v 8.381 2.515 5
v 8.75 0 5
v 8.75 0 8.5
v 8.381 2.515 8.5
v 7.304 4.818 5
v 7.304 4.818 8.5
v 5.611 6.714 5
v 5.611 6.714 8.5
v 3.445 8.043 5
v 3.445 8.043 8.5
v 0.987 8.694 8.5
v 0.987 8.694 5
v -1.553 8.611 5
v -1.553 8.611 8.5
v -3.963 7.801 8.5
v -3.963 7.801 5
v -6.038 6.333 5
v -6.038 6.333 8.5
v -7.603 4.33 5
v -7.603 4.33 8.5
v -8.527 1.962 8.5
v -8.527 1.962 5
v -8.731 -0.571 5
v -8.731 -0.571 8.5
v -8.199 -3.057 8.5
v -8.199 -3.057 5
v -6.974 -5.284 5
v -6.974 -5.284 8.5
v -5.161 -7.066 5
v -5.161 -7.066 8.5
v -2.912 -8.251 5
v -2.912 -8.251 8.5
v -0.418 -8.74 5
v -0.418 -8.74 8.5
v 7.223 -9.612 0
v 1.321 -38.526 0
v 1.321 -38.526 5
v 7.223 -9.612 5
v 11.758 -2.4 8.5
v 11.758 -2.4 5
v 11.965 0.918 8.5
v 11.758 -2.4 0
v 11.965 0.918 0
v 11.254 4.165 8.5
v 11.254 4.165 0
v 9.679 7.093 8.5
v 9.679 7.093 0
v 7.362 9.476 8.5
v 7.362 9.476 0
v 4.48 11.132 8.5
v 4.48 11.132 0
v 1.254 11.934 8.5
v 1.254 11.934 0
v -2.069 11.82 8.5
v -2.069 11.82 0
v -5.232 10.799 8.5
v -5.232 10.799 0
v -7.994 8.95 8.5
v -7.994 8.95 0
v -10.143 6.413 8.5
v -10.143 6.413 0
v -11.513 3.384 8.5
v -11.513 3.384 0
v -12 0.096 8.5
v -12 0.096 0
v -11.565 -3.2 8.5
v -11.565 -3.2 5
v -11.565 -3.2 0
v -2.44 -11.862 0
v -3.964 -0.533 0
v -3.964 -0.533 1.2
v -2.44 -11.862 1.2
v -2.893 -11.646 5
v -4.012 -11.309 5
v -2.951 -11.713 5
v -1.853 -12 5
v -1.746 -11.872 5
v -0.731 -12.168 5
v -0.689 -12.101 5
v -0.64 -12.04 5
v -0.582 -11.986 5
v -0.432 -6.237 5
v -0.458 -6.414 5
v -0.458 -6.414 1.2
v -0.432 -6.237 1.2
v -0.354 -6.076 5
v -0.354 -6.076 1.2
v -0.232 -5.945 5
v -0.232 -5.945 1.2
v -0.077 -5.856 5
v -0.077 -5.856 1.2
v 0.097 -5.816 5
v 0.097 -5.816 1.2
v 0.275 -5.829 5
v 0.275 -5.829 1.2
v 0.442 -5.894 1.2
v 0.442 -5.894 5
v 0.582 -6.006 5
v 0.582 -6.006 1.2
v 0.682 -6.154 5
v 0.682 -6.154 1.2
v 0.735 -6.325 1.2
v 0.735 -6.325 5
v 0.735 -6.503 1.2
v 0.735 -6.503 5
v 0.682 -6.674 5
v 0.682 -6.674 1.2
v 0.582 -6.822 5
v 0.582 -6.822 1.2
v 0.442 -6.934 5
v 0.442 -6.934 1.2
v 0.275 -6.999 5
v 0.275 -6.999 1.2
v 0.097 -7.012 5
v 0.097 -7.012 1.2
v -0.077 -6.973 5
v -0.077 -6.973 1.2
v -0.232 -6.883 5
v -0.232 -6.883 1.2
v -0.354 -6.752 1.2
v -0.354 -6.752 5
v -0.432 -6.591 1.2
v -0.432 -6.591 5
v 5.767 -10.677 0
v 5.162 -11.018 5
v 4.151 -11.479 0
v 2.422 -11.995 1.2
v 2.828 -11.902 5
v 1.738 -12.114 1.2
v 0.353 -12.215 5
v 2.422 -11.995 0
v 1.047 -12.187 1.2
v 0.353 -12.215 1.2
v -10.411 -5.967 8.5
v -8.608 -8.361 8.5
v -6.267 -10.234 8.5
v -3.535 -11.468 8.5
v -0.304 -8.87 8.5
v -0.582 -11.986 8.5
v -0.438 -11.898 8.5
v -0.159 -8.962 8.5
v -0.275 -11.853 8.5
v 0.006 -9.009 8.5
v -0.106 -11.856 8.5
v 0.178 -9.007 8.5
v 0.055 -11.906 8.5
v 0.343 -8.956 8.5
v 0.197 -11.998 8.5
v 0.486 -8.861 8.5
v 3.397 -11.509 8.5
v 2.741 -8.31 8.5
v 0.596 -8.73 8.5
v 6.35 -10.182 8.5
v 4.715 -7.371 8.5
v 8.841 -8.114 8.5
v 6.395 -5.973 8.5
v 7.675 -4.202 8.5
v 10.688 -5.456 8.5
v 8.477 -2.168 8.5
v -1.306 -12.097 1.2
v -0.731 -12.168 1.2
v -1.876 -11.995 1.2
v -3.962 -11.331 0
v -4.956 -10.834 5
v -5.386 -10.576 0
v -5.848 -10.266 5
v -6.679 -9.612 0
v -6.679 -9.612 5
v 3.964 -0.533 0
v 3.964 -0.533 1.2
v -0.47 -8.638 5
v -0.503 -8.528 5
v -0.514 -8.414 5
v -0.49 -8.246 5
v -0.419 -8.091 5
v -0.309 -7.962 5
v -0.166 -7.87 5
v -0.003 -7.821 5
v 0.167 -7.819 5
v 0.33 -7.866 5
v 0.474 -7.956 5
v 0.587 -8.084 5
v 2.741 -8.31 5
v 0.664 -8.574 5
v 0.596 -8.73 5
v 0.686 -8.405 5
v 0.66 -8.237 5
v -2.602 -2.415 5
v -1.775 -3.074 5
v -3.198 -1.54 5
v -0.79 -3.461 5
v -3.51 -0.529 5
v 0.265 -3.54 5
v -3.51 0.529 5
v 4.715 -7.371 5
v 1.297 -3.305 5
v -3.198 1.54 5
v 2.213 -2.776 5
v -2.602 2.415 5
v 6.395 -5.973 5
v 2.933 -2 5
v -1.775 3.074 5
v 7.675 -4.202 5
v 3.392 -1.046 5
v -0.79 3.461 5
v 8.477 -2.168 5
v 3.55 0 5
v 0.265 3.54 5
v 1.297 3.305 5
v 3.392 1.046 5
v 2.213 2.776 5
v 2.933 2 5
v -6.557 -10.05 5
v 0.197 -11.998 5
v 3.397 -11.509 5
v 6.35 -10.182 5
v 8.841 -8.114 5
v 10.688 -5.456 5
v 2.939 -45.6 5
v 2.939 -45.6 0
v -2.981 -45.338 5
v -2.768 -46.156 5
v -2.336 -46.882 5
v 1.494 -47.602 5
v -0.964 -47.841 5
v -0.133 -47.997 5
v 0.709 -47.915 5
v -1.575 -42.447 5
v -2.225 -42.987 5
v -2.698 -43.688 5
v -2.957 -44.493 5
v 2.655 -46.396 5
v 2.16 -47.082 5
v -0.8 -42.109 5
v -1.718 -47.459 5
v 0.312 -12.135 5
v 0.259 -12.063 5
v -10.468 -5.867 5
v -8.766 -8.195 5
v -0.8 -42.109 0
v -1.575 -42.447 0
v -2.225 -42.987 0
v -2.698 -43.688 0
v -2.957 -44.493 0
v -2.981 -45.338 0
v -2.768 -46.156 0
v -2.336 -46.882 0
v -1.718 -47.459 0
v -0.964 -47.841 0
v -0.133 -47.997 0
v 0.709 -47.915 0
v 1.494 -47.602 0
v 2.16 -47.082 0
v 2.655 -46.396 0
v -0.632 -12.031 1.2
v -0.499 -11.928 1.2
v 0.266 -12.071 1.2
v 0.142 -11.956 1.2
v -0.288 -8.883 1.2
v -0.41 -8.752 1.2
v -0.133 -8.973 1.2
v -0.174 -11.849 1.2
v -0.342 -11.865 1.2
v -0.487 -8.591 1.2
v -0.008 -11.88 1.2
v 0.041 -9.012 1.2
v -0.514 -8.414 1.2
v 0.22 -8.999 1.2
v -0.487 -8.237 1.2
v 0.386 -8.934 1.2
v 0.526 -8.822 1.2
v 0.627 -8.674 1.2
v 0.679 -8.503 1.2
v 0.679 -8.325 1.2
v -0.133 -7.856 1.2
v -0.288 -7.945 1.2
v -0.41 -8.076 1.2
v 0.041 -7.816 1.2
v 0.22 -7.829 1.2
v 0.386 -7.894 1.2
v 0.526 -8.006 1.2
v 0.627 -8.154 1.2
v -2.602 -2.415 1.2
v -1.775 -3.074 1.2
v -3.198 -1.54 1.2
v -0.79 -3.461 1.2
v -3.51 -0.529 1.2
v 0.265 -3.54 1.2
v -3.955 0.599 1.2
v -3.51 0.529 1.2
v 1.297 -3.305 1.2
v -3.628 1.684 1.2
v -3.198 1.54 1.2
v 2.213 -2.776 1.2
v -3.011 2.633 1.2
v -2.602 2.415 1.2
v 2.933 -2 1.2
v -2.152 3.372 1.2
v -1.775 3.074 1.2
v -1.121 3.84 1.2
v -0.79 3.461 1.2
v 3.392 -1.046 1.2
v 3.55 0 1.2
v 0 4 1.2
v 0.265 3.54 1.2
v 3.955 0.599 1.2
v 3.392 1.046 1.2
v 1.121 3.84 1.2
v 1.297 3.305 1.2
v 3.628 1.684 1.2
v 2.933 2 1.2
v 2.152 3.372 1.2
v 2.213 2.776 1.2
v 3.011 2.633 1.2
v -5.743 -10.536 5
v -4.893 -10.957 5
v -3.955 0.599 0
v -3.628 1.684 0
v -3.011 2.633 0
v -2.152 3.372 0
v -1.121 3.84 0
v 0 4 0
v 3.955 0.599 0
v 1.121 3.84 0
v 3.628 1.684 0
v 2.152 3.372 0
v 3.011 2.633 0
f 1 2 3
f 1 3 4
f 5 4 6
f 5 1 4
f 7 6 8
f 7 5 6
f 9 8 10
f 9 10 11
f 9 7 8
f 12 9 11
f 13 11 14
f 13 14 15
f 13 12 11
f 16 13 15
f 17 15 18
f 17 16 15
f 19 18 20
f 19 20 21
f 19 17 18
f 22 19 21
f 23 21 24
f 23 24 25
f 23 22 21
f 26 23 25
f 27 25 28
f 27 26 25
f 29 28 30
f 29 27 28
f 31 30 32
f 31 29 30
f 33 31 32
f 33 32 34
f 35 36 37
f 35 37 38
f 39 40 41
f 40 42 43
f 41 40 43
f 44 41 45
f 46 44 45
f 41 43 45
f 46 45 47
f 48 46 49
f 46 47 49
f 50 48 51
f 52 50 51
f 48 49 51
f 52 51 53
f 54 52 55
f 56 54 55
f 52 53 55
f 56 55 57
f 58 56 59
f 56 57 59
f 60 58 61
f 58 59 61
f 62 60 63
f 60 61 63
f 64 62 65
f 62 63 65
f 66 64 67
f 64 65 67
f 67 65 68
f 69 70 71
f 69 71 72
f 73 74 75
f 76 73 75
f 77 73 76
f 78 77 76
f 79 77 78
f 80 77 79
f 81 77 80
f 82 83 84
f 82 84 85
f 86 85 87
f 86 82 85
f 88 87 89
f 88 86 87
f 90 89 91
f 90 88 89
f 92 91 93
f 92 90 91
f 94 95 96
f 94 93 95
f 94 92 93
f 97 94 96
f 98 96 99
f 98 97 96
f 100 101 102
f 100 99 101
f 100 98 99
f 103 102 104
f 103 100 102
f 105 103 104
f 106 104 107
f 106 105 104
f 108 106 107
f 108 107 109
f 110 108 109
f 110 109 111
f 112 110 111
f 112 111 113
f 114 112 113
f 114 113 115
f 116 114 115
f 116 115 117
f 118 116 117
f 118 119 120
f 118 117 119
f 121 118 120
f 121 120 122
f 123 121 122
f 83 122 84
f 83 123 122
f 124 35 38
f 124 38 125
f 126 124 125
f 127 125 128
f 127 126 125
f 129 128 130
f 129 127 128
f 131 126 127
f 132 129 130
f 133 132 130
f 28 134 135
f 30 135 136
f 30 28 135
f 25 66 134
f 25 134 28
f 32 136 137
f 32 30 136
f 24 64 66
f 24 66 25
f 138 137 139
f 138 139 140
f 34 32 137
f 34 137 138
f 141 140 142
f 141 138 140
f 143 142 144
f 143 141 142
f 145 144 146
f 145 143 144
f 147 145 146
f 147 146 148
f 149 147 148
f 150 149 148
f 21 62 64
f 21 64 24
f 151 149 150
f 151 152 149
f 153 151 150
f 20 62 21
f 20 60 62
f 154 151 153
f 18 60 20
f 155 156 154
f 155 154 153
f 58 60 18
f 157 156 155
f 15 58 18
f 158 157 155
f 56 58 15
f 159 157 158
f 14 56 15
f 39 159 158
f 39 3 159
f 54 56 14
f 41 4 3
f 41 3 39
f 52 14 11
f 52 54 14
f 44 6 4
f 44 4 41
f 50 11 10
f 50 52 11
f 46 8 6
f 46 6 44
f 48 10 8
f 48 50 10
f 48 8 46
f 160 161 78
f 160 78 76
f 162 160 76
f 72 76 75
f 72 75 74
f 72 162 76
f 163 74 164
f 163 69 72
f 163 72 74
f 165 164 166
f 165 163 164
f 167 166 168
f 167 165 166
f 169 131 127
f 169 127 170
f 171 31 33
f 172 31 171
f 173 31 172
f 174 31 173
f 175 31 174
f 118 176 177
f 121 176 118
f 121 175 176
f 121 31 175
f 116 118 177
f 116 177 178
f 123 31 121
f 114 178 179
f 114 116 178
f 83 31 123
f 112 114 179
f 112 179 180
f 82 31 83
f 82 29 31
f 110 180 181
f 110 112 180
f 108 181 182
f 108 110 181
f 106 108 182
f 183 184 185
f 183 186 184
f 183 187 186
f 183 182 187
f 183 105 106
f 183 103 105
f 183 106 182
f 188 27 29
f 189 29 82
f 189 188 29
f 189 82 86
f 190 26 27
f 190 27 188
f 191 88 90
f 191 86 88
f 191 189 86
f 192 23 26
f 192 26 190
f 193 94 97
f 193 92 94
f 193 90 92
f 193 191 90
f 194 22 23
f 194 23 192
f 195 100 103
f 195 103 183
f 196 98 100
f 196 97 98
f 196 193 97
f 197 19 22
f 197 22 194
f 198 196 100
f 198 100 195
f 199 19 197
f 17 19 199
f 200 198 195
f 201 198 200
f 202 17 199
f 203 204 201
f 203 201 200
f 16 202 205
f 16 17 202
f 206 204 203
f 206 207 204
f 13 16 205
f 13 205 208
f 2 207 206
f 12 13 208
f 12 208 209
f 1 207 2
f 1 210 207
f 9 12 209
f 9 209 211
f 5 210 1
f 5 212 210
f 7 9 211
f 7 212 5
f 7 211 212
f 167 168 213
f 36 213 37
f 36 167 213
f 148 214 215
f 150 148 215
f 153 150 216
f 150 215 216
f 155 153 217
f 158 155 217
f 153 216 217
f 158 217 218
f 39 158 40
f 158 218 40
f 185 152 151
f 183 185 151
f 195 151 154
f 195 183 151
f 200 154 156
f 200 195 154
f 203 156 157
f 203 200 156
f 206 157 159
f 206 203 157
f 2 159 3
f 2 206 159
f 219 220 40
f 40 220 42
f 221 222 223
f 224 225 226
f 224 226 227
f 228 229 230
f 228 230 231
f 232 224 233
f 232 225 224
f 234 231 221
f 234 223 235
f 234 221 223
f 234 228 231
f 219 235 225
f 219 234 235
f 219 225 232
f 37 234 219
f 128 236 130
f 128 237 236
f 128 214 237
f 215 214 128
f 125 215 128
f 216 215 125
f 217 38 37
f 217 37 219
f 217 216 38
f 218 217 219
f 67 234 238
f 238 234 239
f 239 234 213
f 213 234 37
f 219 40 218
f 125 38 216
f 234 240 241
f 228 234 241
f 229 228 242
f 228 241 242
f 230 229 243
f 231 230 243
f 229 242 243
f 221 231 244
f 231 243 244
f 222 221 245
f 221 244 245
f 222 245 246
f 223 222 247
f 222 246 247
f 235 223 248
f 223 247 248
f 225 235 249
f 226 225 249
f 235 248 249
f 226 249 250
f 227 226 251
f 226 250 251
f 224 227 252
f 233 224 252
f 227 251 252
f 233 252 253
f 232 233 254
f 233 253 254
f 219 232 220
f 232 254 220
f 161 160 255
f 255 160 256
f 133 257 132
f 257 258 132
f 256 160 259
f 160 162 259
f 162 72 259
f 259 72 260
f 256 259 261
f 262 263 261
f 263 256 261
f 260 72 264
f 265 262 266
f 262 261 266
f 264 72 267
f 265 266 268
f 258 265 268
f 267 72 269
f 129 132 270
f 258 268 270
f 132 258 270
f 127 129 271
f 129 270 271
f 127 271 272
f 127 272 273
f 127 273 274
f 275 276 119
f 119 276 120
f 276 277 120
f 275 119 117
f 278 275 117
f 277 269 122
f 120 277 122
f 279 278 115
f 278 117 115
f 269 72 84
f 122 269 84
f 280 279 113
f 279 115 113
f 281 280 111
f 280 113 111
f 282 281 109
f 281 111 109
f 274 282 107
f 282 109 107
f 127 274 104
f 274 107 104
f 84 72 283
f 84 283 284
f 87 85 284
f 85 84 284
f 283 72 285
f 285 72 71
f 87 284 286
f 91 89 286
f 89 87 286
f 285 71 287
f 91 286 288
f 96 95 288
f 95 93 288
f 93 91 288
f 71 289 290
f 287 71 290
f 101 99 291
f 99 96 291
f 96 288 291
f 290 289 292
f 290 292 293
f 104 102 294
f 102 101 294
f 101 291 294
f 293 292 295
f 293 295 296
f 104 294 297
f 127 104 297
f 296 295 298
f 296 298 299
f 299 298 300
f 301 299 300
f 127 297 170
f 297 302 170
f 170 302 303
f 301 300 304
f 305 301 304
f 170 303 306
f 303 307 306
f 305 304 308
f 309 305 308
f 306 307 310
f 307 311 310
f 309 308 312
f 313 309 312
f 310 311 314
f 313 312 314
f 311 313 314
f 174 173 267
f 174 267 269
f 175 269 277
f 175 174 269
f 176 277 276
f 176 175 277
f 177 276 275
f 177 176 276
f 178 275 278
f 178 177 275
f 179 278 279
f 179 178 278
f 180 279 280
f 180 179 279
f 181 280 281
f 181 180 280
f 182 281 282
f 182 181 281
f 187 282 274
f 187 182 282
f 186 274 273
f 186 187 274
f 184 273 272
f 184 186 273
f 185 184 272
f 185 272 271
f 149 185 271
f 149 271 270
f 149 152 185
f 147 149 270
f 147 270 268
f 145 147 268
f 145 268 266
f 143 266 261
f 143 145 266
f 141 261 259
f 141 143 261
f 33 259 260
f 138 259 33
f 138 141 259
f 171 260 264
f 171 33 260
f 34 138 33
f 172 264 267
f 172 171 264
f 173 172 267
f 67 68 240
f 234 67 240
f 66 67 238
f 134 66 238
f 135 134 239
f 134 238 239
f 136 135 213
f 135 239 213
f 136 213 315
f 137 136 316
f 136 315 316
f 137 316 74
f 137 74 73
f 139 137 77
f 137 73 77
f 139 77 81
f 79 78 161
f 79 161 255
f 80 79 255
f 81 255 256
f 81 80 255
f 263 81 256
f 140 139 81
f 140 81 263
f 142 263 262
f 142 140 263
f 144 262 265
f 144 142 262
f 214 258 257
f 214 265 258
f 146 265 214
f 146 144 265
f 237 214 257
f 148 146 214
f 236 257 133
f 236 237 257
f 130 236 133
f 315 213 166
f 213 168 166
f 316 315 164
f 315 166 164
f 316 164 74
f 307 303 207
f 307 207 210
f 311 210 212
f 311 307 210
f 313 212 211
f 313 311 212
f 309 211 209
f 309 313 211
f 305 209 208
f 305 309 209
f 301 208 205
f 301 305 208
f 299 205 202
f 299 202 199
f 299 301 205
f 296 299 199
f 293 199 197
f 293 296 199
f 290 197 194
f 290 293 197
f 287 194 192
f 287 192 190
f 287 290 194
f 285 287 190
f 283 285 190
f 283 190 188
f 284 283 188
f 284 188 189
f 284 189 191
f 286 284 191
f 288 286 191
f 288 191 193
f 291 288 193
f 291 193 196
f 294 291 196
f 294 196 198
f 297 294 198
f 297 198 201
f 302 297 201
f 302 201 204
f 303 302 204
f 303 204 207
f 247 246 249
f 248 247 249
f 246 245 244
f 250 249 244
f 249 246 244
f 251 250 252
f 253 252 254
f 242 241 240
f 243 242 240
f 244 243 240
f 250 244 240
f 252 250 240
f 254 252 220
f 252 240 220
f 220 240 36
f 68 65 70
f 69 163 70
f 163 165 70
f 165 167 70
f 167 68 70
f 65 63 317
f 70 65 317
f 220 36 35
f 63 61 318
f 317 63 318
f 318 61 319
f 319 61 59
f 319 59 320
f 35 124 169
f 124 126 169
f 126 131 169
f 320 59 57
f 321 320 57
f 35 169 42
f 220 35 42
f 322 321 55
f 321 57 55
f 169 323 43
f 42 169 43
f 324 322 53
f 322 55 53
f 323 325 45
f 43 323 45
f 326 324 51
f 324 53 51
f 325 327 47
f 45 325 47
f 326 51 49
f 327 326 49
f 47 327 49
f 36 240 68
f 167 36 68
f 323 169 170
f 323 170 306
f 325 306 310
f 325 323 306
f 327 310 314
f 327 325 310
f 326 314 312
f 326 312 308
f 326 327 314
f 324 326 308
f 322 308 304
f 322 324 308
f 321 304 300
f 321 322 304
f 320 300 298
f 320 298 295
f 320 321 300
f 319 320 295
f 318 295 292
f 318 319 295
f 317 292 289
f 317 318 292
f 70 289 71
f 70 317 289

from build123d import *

# Parameters (mm, degrees)
SKETCH1_R               = 3.55
BOSS_EXTRUDE1_DEPTH     = 5
CUT_EXTRUDE1_DEPTH      = 1.2
SKETCH3_R               = 8.75
BOSS_EXTRUDE2_DEPTH     = 3.5
CUT_EXTRUDE2_DEPTH      = 51.012898336
CUT_EXTRUDE2_DEPTH_BACK = 51.012898336
SKETCH5_R               = 0.6


with BuildPart() as part:
    # Sketch1 → Boss-Extrude1 (new body)
    with BuildSketch(Plane.XY):
        with BuildLine():
            Line((2.939387691, -45.6), (11.757550765, -2.4))
            ThreePointArc((11.757550765, -2.4), (-0.411368636, 11.992946921), (-11.565465836, -3.2))
            Line((-11.565465836, -3.2), (-0.8, -42.108633541))
            ThreePointArc((-0.8, -42.108633541), (-2.047353135, -47.192793912), (2.939387691, -45.6))
        make_face()
        Circle(SKETCH1_R, mode=Mode.SUBTRACT)
        with BuildLine():
            Line((1.321479166, -38.526100673), (7.223456236, -9.612436083))
            ThreePointArc((7.223456236, -9.612436083), (0.272467701, -12.215673533), (-6.678520834, -9.612436083))
            Line((-6.678520834, -9.612436083), (1.321479166, -38.526100673))
        make_face(mode=Mode.SUBTRACT)
    extrude(amount=BOSS_EXTRUDE1_DEPTH)

    # Sketch2 → Cut-Extrude1 (cut)
    with BuildSketch(Plane(origin=(0, 0, 0), x_dir=(-1, 0, 0), z_dir=(0, 0, -1))):
        with BuildLine():
            Line((-1.9821425, -15.266666667), (-3.964284999, -0.533333333))
            ThreePointArc((-3.964284999, -0.533333333), (0, 4), (3.964284999, -0.533333333))
            Line((3.964284999, -0.533333333), (1.9821425, -15.266666667))
            ThreePointArc((1.9821425, -15.266666667), (0, -17), (-1.9821425, -15.266666667))
        make_face()
    extrude(amount=-CUT_EXTRUDE1_DEPTH, mode=Mode.SUBTRACT)

    # Sketch3 → Boss-Extrude2 (add)
    with BuildSketch(Plane.XY.offset(5)):
        with BuildLine():
            ThreePointArc((11.757550765, -2.4), (-0.411368636, 11.992946921), (-11.565465836, -3.2))
            ThreePointArc((-11.565465836, -3.2), (0.411368636, -11.992946921), (11.757550765, -2.4))
        make_face()
        Circle(SKETCH3_R, mode=Mode.SUBTRACT)
    extrude(amount=BOSS_EXTRUDE2_DEPTH)

    # Sketch5 → Cut-Extrude2 (cut, two sides: drawn at the far end of the back side and taken through both)
    with BuildSketch(Plane(origin=(0, 0, 1.2), x_dir=(-1, 0, 0), z_dir=(0, 0, -1)).offset(-CUT_EXTRUDE2_DEPTH_BACK)):
        with Locations((-0.141802358, -6.414025874)):
            Circle(SKETCH5_R)
        with Locations((-0.086177178, -8.414025874)):
            Circle(SKETCH5_R)
        with Locations((0.232439079, -14.448130401)):
            Circle(SKETCH5_R)
        with Locations((0.20026758, -12.448389169)):
            Circle(SKETCH5_R)
    extrude(amount=CUT_EXTRUDE2_DEPTH + CUT_EXTRUDE2_DEPTH_BACK, mode=Mode.SUBTRACT)


solid = part.part
